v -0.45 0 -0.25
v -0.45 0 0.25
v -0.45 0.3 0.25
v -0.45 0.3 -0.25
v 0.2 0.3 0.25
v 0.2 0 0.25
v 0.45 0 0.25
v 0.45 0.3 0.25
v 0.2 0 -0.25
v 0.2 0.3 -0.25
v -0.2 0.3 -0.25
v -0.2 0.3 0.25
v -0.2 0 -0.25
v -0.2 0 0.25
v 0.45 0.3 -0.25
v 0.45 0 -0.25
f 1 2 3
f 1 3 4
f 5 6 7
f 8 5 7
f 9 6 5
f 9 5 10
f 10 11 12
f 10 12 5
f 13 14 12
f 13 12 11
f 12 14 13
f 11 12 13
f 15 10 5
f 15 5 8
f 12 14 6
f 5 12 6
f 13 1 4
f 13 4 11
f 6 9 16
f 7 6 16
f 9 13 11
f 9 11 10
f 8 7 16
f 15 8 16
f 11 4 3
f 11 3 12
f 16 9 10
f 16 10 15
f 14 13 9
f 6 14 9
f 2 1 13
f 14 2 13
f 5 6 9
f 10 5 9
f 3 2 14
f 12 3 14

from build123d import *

# Parameters (mm, degrees)
SKETCH1_W             = 0.4
SKETCH1_H             = 0.5
BOSS_EXTRUDE1_DEPTH   = 0.3
SKETCH2_W             = 0.25
SKETCH2_H             = 0.5
BOSS_EXTRUDE2_DEPTH   = 0.3
BOSS_EXTRUDE2_2_DEPTH = 0.3


with BuildPart() as part:
    # Sketch1 → Boss-Extrude1 (new body)
    with BuildSketch(Plane(origin=(0, 0, 0), x_dir=(1, 0, 0), z_dir=(0, 1, 0))):
        Rectangle(SKETCH1_W, SKETCH1_H)
    extrude(amount=BOSS_EXTRUDE1_DEPTH)


with BuildPart() as body_2:
    # Sketch2 → Boss-Extrude2 (new body)
    with BuildSketch(Plane(origin=(0, 0, 0), x_dir=(1, 0, 0), z_dir=(0, 1, 0))):
        with Locations((-0.325, 0)):
            Rectangle(SKETCH2_W, SKETCH2_H)
    extrude(amount=BOSS_EXTRUDE2_DEPTH)


with BuildPart() as body_3:
    # Sketch2 → Boss-Extrude2 2 (new body)
    with BuildSketch(Plane(origin=(0, 0, 0), x_dir=(1, 0, 0), z_dir=(0, 1, 0))):
        with Locations((0.325, 0)):
            Rectangle(SKETCH2_W, SKETCH2_H)
    extrude(amount=BOSS_EXTRUDE2_2_DEPTH)


solid = Compound([part.part, body_2.part, body_3.part])
